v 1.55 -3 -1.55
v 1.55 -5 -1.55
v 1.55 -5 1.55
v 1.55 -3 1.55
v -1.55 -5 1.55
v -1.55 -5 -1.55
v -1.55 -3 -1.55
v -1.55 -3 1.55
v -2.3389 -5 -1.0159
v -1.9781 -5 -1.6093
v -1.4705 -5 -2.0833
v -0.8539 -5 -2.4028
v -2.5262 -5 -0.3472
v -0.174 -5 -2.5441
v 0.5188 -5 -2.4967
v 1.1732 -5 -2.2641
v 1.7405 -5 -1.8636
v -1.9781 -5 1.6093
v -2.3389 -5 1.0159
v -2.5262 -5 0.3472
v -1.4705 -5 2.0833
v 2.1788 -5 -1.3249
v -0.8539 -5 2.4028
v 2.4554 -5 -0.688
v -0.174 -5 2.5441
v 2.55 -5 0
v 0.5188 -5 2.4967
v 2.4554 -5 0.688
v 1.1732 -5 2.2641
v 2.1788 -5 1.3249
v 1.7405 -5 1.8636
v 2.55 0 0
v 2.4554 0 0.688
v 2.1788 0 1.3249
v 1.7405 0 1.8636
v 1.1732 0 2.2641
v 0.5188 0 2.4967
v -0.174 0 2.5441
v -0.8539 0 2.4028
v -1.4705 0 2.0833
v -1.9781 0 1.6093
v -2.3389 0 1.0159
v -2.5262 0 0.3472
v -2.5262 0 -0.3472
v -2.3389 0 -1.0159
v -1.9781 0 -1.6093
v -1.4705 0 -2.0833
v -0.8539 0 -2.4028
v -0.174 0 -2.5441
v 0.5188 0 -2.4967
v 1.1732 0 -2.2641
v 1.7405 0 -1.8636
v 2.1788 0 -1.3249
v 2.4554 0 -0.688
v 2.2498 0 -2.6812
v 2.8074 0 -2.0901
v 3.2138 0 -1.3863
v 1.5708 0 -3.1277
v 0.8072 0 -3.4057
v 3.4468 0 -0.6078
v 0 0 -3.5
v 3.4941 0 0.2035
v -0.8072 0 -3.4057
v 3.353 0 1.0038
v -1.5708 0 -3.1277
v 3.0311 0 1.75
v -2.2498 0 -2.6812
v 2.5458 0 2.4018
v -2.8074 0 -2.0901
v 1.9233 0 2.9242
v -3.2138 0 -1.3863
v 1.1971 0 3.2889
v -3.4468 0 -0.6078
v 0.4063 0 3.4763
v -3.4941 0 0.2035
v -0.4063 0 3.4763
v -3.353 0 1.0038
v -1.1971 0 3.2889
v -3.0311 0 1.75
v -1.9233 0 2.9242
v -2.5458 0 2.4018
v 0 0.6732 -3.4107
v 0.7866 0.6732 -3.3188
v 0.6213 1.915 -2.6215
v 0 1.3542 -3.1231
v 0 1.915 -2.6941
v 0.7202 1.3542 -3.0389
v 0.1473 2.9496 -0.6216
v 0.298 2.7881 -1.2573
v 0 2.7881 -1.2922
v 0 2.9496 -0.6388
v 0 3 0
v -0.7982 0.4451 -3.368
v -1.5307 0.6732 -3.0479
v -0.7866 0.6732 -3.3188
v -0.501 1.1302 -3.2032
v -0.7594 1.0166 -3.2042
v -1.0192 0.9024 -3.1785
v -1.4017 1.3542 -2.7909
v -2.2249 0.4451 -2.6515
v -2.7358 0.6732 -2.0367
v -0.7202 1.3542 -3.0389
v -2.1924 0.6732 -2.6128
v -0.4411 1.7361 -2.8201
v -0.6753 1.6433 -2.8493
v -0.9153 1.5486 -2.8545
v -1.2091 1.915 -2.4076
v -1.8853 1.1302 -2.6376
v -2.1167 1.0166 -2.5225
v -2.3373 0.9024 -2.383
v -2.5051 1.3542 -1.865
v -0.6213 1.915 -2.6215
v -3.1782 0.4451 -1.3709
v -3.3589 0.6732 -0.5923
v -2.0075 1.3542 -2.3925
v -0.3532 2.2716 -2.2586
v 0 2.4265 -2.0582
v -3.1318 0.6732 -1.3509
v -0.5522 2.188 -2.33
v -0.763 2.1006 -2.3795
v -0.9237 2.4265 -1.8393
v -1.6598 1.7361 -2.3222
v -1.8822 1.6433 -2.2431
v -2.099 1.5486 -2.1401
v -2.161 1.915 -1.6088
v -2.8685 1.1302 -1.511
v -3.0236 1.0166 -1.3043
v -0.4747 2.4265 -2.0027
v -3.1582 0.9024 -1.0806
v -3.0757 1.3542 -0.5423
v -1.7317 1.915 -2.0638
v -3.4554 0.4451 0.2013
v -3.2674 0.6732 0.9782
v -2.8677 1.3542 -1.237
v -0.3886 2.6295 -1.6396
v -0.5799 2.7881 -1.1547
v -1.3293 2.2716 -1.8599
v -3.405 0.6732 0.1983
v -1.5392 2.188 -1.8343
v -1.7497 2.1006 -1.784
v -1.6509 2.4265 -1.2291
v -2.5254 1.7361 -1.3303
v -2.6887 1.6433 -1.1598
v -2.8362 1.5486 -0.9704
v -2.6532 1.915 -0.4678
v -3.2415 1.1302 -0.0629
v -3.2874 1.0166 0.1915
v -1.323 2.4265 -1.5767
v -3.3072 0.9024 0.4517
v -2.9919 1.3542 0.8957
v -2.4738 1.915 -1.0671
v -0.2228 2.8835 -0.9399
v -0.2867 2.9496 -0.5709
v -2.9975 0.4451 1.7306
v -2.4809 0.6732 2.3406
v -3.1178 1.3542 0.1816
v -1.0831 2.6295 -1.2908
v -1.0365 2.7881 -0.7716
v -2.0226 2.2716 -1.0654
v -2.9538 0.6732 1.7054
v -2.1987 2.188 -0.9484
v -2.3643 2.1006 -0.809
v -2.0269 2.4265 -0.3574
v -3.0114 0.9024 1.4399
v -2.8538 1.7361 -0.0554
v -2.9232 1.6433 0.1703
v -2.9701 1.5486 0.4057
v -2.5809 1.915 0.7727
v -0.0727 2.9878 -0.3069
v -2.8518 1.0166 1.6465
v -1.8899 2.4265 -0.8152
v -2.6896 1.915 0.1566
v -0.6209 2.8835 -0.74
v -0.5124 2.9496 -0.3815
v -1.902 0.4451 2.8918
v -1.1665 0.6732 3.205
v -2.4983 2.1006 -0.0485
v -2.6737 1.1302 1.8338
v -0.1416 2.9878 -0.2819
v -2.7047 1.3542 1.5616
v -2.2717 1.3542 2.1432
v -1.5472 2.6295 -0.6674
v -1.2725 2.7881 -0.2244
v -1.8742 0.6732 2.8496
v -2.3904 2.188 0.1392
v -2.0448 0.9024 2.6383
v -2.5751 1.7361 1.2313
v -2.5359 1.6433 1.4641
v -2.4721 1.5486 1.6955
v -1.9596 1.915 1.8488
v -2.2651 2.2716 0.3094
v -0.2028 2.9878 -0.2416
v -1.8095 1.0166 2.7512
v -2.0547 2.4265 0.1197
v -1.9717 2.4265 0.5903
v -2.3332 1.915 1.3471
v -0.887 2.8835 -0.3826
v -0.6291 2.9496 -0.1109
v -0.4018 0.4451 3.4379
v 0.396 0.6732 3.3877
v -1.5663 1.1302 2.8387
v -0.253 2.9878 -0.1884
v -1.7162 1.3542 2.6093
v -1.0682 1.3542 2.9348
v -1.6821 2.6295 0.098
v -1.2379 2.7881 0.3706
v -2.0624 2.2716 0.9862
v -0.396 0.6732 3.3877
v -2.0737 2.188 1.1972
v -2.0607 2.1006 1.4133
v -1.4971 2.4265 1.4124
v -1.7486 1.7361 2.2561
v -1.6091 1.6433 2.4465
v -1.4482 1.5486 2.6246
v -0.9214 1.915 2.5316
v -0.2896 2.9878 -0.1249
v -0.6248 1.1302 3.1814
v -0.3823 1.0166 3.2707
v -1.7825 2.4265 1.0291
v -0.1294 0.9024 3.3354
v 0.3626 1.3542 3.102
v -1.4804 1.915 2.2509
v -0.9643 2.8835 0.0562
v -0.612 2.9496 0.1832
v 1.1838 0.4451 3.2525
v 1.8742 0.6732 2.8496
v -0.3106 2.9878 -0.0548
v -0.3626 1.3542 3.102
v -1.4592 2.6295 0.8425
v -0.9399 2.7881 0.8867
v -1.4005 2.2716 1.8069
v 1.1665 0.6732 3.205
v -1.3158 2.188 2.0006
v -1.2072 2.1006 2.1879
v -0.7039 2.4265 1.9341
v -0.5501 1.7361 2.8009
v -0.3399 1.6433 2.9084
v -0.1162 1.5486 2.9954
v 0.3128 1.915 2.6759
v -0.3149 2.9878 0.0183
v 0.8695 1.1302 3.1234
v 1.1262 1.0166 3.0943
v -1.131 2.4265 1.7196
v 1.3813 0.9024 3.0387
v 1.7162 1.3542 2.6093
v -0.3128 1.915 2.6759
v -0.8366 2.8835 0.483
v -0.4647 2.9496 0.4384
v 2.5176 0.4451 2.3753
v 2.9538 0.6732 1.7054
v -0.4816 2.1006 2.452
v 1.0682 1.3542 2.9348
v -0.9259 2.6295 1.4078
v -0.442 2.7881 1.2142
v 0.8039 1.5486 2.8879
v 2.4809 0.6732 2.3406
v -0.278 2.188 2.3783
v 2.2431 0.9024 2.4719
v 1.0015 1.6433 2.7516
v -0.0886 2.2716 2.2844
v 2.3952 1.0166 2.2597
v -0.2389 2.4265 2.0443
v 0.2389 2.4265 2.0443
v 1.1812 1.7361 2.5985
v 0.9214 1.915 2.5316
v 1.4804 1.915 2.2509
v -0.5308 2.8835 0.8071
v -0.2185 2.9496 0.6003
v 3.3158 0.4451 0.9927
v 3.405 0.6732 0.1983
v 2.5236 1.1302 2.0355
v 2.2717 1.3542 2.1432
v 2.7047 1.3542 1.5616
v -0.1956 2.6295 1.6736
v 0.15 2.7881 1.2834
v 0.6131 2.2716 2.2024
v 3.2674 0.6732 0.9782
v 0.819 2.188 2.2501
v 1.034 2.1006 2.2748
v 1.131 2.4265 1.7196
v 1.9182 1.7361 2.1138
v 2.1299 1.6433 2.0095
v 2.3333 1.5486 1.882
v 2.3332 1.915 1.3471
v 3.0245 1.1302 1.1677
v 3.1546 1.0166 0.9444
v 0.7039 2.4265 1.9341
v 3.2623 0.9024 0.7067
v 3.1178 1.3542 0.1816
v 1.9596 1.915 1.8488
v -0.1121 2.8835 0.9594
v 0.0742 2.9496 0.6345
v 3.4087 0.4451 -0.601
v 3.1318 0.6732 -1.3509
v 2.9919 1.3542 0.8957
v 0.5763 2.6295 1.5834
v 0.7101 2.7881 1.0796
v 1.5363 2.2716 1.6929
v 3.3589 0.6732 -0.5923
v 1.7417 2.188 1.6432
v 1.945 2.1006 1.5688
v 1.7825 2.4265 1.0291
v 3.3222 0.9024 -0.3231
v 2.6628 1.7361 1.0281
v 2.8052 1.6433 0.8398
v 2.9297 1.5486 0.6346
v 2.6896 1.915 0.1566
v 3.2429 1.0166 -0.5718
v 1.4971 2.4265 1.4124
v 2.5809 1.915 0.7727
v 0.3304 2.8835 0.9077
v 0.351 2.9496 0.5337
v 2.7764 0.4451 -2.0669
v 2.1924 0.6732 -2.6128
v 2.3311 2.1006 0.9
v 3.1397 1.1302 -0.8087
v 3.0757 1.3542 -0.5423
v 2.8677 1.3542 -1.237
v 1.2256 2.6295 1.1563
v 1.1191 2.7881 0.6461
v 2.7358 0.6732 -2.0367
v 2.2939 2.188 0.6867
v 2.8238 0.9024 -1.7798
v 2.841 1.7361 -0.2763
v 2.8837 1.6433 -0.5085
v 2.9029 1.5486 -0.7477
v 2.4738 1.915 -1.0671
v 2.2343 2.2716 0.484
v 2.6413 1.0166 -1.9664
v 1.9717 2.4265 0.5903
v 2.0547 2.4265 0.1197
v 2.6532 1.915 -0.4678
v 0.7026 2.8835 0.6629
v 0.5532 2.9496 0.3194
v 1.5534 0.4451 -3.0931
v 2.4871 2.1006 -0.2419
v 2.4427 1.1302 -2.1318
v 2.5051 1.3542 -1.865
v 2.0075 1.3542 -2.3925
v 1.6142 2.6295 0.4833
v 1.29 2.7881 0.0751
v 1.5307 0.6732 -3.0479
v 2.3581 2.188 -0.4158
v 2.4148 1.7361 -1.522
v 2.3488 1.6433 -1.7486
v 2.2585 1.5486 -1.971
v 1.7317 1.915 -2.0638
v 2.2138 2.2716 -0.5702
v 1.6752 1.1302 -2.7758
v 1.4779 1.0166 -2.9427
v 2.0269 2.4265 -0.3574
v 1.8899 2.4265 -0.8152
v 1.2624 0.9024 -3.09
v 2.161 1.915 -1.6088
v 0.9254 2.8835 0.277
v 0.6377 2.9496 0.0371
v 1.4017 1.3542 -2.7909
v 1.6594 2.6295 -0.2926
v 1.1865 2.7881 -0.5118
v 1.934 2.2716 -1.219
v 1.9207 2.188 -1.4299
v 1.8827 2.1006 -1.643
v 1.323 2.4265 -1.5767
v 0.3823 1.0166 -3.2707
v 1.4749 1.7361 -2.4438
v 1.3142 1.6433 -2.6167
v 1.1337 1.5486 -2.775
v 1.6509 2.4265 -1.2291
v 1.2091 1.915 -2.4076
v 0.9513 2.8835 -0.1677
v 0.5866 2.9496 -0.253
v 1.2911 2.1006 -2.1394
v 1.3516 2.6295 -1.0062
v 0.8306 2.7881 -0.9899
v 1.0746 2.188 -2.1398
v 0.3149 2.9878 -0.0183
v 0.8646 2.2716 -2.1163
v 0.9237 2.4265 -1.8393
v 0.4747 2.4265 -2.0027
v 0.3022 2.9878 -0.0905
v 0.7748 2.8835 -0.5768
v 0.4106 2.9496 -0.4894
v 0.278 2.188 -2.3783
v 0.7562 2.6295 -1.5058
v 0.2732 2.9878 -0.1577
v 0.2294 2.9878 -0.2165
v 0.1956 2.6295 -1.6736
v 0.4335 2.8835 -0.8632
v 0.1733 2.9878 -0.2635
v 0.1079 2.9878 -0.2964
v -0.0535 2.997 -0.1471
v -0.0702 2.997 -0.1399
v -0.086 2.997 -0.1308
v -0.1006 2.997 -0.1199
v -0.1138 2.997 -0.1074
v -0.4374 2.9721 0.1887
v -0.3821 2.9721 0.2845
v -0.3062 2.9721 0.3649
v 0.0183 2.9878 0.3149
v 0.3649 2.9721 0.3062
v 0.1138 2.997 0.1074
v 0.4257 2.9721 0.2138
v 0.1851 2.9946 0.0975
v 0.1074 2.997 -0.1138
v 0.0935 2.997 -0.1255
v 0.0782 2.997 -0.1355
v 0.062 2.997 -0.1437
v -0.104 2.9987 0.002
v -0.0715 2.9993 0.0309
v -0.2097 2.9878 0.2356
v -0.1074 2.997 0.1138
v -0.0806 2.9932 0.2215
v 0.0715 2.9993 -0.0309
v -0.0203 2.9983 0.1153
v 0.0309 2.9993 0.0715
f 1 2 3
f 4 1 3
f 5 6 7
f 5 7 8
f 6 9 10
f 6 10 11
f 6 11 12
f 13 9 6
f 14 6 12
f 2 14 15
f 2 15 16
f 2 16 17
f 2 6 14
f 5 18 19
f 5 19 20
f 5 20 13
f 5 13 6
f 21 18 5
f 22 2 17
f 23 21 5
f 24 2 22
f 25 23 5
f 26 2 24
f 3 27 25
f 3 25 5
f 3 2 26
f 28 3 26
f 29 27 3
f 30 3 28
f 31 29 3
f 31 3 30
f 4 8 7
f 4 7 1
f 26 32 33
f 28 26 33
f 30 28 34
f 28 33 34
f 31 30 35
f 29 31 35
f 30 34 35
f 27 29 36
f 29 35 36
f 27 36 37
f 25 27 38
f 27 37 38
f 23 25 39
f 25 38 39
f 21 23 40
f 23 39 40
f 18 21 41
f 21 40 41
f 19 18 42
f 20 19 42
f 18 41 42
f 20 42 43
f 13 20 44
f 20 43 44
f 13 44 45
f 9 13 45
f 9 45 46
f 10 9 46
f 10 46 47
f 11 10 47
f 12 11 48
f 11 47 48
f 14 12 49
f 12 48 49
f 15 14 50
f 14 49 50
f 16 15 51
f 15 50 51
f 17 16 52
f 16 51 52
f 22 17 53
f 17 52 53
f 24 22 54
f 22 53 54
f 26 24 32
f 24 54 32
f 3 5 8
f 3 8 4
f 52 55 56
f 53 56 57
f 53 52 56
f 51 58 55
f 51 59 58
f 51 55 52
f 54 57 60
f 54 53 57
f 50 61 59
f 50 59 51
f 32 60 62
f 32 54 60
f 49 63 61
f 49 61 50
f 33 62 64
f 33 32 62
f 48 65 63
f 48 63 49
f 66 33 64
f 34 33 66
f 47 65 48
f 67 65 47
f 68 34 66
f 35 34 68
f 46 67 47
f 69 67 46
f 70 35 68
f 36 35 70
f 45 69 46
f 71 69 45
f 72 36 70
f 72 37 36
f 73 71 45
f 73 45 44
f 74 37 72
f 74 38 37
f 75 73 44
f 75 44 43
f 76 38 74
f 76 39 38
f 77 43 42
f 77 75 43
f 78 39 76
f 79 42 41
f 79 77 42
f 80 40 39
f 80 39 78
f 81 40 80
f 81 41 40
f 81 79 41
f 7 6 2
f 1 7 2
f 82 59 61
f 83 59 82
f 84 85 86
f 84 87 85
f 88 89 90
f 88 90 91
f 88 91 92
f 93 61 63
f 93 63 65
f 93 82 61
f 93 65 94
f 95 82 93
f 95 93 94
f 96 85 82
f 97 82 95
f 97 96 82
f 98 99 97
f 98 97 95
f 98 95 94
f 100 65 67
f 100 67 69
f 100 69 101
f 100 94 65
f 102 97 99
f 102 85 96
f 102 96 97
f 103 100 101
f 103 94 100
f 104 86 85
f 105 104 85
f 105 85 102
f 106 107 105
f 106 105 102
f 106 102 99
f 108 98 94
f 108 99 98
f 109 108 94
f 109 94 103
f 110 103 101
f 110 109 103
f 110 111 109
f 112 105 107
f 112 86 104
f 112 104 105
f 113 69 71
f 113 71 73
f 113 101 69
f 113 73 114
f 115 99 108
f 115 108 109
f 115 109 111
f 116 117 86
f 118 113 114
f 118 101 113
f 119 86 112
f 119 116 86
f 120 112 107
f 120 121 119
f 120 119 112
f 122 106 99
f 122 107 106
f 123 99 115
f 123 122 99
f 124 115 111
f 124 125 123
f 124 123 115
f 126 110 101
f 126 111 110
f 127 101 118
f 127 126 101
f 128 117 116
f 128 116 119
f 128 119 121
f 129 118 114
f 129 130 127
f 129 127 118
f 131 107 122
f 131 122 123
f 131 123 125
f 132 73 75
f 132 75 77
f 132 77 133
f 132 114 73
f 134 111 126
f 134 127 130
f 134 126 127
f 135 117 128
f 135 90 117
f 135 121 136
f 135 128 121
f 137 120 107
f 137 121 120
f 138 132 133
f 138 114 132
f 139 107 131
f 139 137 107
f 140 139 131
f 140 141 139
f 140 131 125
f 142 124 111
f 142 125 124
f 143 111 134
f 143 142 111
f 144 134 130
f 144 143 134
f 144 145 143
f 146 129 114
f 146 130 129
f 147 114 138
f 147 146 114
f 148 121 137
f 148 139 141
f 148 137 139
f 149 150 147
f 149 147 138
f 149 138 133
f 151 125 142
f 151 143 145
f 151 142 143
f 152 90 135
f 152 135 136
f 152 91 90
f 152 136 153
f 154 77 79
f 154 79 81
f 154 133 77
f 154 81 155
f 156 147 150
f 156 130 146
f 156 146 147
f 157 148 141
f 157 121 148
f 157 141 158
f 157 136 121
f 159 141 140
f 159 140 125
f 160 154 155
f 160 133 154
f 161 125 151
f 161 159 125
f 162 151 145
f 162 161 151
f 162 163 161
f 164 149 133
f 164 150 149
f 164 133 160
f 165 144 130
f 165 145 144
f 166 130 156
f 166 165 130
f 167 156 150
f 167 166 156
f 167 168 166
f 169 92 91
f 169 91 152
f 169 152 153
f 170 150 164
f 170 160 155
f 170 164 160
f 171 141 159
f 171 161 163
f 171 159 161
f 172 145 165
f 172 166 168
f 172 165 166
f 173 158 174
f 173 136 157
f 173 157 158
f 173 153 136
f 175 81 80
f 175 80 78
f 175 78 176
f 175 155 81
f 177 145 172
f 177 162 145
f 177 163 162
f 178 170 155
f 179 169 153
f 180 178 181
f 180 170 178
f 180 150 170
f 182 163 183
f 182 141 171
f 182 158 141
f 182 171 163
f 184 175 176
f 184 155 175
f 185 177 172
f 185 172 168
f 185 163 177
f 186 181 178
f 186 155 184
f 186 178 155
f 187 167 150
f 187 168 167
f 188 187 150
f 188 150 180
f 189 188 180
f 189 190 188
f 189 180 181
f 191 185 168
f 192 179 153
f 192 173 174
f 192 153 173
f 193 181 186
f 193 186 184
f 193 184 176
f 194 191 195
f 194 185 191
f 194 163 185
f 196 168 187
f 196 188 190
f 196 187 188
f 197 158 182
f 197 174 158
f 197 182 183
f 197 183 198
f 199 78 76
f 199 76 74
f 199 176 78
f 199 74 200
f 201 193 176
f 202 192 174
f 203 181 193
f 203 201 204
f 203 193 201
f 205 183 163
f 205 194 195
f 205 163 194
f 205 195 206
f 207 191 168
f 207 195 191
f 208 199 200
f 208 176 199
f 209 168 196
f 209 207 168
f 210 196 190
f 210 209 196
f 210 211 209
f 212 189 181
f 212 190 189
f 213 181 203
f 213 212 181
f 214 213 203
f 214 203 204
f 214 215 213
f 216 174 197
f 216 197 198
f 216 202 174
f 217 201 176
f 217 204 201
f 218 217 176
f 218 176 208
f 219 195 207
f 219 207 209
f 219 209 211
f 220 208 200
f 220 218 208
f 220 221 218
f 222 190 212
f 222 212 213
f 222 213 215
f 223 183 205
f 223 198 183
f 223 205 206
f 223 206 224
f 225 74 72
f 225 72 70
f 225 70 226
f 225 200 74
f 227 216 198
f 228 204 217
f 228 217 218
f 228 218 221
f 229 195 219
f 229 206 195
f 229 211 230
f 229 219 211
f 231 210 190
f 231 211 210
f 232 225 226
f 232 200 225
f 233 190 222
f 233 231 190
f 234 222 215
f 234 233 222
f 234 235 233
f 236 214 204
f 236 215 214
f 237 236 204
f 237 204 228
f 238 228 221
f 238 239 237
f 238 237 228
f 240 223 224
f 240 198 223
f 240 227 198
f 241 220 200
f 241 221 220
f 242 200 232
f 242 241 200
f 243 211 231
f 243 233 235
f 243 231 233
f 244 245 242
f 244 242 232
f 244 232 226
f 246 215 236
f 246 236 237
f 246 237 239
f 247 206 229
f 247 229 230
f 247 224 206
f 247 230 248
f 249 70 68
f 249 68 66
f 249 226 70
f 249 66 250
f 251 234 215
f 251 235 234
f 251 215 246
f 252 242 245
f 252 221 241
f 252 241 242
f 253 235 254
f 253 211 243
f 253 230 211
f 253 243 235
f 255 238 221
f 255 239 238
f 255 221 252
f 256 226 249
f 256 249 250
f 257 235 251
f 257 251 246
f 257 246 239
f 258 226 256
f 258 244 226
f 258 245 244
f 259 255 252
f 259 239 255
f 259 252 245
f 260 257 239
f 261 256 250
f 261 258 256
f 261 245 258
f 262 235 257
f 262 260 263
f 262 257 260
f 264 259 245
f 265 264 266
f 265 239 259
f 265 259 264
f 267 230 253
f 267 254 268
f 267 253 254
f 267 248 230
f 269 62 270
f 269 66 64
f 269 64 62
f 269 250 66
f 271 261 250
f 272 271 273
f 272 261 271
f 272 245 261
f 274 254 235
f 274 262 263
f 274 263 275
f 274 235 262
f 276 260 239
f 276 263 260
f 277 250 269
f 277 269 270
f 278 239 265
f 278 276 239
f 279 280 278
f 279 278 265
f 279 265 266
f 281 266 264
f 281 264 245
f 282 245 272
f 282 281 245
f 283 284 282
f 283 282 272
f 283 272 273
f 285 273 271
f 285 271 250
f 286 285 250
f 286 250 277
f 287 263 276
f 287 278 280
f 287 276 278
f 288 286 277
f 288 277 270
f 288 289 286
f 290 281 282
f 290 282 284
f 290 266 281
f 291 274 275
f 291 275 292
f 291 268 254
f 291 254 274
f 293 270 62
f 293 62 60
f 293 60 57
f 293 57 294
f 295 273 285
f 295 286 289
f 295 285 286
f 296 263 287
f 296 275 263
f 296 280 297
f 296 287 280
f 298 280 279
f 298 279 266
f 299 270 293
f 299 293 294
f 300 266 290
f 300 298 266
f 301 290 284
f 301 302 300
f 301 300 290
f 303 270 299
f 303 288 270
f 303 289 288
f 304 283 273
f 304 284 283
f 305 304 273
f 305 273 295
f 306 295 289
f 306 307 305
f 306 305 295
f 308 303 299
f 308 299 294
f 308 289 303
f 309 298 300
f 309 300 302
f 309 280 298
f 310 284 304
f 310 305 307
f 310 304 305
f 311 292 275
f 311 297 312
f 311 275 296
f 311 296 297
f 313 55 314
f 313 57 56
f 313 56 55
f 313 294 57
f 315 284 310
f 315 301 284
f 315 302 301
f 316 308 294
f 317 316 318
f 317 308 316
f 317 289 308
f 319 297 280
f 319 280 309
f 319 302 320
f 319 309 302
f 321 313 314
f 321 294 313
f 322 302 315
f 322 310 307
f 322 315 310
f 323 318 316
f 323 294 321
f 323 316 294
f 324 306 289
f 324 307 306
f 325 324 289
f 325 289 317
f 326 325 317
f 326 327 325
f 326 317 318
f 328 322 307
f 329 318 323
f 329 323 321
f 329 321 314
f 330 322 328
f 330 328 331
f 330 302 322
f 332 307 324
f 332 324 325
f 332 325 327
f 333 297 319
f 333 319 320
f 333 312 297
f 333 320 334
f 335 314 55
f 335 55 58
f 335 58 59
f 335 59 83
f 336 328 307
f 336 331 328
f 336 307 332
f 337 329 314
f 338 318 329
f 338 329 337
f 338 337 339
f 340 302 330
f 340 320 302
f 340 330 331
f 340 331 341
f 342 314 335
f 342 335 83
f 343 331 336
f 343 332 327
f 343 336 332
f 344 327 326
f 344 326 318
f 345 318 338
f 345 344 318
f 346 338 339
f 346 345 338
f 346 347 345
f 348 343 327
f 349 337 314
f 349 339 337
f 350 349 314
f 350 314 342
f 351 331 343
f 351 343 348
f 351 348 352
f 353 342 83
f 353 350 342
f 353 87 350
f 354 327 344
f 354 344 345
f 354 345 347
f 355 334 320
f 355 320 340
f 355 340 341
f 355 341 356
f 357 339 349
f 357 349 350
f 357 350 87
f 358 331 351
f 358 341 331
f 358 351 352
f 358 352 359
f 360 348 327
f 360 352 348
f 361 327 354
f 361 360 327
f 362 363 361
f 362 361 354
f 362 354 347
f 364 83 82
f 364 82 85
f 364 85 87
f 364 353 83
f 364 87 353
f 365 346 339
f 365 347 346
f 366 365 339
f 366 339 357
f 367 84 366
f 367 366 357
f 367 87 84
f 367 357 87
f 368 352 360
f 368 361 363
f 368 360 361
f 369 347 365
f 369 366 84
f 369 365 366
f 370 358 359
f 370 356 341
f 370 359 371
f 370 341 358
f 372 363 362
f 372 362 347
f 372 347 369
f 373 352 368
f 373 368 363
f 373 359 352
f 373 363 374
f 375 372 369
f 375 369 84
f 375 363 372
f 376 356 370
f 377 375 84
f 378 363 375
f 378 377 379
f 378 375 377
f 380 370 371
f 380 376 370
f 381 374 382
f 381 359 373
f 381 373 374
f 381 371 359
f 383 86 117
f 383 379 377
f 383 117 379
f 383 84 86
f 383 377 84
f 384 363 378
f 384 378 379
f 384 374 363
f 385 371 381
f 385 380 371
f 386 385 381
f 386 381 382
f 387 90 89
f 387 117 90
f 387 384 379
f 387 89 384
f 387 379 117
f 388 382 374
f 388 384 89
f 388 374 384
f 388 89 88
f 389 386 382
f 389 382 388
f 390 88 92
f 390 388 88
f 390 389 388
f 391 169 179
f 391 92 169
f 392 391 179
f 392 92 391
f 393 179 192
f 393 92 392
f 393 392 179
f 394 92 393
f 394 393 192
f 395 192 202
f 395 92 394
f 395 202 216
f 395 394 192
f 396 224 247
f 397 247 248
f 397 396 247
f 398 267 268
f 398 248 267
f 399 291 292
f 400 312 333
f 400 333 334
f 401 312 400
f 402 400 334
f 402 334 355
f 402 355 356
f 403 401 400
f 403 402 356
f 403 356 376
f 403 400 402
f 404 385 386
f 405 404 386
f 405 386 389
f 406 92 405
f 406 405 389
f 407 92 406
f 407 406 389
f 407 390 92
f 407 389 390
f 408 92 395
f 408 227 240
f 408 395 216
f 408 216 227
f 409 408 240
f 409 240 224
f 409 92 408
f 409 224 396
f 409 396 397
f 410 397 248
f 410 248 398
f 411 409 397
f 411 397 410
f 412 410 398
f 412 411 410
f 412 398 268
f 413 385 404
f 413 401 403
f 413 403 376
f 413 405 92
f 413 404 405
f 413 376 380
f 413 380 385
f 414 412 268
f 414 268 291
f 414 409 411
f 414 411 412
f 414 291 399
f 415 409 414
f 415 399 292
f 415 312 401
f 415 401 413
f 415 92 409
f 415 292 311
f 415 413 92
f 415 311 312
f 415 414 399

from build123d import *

# Parameters (mm, degrees)
SKETCH3_R           = 2.55
BOSS_EXTRUDE1_DEPTH = 5
SKETCH4_W           = 3.1
SKETCH4_H           = 3.1
CUT_EXTRUDE1_DEPTH  = 2


with BuildPart() as part:
    # Sketch1 → Revolve5 (revolve)
    with BuildSketch(Plane(origin=(0, 0, 0), x_dir=(0, 0, -1), z_dir=(1, 0, 0))):
        with BuildLine():
            Line((0, 3), (0, 0))
            Line((0, 0), (3.5, 0))
            add(Edge.make_bspline(
                [(3.5, 0), (3.5, 3), (0, 3)],
                knots=[3.141592654, 3.141592654, 3.141592654, 4.71238898, 4.71238898, 4.71238898], degree=2, weights=[1, 0.707106781, 1]))
        make_face()
    revolve(axis=Axis((0, 0, 0), (0, 1, 0)))

    # Sketch3 → Boss-Extrude1 (add)
    with BuildSketch(Plane.XZ):
        Circle(SKETCH3_R)
    extrude(amount=BOSS_EXTRUDE1_DEPTH)

    # Sketch4 → Cut-Extrude1 (cut)
    with BuildSketch(Plane.XZ.offset(5)):
        Rectangle(SKETCH4_W, SKETCH4_H)
    extrude(amount=-CUT_EXTRUDE1_DEPTH, mode=Mode.SUBTRACT)


solid = part.part
